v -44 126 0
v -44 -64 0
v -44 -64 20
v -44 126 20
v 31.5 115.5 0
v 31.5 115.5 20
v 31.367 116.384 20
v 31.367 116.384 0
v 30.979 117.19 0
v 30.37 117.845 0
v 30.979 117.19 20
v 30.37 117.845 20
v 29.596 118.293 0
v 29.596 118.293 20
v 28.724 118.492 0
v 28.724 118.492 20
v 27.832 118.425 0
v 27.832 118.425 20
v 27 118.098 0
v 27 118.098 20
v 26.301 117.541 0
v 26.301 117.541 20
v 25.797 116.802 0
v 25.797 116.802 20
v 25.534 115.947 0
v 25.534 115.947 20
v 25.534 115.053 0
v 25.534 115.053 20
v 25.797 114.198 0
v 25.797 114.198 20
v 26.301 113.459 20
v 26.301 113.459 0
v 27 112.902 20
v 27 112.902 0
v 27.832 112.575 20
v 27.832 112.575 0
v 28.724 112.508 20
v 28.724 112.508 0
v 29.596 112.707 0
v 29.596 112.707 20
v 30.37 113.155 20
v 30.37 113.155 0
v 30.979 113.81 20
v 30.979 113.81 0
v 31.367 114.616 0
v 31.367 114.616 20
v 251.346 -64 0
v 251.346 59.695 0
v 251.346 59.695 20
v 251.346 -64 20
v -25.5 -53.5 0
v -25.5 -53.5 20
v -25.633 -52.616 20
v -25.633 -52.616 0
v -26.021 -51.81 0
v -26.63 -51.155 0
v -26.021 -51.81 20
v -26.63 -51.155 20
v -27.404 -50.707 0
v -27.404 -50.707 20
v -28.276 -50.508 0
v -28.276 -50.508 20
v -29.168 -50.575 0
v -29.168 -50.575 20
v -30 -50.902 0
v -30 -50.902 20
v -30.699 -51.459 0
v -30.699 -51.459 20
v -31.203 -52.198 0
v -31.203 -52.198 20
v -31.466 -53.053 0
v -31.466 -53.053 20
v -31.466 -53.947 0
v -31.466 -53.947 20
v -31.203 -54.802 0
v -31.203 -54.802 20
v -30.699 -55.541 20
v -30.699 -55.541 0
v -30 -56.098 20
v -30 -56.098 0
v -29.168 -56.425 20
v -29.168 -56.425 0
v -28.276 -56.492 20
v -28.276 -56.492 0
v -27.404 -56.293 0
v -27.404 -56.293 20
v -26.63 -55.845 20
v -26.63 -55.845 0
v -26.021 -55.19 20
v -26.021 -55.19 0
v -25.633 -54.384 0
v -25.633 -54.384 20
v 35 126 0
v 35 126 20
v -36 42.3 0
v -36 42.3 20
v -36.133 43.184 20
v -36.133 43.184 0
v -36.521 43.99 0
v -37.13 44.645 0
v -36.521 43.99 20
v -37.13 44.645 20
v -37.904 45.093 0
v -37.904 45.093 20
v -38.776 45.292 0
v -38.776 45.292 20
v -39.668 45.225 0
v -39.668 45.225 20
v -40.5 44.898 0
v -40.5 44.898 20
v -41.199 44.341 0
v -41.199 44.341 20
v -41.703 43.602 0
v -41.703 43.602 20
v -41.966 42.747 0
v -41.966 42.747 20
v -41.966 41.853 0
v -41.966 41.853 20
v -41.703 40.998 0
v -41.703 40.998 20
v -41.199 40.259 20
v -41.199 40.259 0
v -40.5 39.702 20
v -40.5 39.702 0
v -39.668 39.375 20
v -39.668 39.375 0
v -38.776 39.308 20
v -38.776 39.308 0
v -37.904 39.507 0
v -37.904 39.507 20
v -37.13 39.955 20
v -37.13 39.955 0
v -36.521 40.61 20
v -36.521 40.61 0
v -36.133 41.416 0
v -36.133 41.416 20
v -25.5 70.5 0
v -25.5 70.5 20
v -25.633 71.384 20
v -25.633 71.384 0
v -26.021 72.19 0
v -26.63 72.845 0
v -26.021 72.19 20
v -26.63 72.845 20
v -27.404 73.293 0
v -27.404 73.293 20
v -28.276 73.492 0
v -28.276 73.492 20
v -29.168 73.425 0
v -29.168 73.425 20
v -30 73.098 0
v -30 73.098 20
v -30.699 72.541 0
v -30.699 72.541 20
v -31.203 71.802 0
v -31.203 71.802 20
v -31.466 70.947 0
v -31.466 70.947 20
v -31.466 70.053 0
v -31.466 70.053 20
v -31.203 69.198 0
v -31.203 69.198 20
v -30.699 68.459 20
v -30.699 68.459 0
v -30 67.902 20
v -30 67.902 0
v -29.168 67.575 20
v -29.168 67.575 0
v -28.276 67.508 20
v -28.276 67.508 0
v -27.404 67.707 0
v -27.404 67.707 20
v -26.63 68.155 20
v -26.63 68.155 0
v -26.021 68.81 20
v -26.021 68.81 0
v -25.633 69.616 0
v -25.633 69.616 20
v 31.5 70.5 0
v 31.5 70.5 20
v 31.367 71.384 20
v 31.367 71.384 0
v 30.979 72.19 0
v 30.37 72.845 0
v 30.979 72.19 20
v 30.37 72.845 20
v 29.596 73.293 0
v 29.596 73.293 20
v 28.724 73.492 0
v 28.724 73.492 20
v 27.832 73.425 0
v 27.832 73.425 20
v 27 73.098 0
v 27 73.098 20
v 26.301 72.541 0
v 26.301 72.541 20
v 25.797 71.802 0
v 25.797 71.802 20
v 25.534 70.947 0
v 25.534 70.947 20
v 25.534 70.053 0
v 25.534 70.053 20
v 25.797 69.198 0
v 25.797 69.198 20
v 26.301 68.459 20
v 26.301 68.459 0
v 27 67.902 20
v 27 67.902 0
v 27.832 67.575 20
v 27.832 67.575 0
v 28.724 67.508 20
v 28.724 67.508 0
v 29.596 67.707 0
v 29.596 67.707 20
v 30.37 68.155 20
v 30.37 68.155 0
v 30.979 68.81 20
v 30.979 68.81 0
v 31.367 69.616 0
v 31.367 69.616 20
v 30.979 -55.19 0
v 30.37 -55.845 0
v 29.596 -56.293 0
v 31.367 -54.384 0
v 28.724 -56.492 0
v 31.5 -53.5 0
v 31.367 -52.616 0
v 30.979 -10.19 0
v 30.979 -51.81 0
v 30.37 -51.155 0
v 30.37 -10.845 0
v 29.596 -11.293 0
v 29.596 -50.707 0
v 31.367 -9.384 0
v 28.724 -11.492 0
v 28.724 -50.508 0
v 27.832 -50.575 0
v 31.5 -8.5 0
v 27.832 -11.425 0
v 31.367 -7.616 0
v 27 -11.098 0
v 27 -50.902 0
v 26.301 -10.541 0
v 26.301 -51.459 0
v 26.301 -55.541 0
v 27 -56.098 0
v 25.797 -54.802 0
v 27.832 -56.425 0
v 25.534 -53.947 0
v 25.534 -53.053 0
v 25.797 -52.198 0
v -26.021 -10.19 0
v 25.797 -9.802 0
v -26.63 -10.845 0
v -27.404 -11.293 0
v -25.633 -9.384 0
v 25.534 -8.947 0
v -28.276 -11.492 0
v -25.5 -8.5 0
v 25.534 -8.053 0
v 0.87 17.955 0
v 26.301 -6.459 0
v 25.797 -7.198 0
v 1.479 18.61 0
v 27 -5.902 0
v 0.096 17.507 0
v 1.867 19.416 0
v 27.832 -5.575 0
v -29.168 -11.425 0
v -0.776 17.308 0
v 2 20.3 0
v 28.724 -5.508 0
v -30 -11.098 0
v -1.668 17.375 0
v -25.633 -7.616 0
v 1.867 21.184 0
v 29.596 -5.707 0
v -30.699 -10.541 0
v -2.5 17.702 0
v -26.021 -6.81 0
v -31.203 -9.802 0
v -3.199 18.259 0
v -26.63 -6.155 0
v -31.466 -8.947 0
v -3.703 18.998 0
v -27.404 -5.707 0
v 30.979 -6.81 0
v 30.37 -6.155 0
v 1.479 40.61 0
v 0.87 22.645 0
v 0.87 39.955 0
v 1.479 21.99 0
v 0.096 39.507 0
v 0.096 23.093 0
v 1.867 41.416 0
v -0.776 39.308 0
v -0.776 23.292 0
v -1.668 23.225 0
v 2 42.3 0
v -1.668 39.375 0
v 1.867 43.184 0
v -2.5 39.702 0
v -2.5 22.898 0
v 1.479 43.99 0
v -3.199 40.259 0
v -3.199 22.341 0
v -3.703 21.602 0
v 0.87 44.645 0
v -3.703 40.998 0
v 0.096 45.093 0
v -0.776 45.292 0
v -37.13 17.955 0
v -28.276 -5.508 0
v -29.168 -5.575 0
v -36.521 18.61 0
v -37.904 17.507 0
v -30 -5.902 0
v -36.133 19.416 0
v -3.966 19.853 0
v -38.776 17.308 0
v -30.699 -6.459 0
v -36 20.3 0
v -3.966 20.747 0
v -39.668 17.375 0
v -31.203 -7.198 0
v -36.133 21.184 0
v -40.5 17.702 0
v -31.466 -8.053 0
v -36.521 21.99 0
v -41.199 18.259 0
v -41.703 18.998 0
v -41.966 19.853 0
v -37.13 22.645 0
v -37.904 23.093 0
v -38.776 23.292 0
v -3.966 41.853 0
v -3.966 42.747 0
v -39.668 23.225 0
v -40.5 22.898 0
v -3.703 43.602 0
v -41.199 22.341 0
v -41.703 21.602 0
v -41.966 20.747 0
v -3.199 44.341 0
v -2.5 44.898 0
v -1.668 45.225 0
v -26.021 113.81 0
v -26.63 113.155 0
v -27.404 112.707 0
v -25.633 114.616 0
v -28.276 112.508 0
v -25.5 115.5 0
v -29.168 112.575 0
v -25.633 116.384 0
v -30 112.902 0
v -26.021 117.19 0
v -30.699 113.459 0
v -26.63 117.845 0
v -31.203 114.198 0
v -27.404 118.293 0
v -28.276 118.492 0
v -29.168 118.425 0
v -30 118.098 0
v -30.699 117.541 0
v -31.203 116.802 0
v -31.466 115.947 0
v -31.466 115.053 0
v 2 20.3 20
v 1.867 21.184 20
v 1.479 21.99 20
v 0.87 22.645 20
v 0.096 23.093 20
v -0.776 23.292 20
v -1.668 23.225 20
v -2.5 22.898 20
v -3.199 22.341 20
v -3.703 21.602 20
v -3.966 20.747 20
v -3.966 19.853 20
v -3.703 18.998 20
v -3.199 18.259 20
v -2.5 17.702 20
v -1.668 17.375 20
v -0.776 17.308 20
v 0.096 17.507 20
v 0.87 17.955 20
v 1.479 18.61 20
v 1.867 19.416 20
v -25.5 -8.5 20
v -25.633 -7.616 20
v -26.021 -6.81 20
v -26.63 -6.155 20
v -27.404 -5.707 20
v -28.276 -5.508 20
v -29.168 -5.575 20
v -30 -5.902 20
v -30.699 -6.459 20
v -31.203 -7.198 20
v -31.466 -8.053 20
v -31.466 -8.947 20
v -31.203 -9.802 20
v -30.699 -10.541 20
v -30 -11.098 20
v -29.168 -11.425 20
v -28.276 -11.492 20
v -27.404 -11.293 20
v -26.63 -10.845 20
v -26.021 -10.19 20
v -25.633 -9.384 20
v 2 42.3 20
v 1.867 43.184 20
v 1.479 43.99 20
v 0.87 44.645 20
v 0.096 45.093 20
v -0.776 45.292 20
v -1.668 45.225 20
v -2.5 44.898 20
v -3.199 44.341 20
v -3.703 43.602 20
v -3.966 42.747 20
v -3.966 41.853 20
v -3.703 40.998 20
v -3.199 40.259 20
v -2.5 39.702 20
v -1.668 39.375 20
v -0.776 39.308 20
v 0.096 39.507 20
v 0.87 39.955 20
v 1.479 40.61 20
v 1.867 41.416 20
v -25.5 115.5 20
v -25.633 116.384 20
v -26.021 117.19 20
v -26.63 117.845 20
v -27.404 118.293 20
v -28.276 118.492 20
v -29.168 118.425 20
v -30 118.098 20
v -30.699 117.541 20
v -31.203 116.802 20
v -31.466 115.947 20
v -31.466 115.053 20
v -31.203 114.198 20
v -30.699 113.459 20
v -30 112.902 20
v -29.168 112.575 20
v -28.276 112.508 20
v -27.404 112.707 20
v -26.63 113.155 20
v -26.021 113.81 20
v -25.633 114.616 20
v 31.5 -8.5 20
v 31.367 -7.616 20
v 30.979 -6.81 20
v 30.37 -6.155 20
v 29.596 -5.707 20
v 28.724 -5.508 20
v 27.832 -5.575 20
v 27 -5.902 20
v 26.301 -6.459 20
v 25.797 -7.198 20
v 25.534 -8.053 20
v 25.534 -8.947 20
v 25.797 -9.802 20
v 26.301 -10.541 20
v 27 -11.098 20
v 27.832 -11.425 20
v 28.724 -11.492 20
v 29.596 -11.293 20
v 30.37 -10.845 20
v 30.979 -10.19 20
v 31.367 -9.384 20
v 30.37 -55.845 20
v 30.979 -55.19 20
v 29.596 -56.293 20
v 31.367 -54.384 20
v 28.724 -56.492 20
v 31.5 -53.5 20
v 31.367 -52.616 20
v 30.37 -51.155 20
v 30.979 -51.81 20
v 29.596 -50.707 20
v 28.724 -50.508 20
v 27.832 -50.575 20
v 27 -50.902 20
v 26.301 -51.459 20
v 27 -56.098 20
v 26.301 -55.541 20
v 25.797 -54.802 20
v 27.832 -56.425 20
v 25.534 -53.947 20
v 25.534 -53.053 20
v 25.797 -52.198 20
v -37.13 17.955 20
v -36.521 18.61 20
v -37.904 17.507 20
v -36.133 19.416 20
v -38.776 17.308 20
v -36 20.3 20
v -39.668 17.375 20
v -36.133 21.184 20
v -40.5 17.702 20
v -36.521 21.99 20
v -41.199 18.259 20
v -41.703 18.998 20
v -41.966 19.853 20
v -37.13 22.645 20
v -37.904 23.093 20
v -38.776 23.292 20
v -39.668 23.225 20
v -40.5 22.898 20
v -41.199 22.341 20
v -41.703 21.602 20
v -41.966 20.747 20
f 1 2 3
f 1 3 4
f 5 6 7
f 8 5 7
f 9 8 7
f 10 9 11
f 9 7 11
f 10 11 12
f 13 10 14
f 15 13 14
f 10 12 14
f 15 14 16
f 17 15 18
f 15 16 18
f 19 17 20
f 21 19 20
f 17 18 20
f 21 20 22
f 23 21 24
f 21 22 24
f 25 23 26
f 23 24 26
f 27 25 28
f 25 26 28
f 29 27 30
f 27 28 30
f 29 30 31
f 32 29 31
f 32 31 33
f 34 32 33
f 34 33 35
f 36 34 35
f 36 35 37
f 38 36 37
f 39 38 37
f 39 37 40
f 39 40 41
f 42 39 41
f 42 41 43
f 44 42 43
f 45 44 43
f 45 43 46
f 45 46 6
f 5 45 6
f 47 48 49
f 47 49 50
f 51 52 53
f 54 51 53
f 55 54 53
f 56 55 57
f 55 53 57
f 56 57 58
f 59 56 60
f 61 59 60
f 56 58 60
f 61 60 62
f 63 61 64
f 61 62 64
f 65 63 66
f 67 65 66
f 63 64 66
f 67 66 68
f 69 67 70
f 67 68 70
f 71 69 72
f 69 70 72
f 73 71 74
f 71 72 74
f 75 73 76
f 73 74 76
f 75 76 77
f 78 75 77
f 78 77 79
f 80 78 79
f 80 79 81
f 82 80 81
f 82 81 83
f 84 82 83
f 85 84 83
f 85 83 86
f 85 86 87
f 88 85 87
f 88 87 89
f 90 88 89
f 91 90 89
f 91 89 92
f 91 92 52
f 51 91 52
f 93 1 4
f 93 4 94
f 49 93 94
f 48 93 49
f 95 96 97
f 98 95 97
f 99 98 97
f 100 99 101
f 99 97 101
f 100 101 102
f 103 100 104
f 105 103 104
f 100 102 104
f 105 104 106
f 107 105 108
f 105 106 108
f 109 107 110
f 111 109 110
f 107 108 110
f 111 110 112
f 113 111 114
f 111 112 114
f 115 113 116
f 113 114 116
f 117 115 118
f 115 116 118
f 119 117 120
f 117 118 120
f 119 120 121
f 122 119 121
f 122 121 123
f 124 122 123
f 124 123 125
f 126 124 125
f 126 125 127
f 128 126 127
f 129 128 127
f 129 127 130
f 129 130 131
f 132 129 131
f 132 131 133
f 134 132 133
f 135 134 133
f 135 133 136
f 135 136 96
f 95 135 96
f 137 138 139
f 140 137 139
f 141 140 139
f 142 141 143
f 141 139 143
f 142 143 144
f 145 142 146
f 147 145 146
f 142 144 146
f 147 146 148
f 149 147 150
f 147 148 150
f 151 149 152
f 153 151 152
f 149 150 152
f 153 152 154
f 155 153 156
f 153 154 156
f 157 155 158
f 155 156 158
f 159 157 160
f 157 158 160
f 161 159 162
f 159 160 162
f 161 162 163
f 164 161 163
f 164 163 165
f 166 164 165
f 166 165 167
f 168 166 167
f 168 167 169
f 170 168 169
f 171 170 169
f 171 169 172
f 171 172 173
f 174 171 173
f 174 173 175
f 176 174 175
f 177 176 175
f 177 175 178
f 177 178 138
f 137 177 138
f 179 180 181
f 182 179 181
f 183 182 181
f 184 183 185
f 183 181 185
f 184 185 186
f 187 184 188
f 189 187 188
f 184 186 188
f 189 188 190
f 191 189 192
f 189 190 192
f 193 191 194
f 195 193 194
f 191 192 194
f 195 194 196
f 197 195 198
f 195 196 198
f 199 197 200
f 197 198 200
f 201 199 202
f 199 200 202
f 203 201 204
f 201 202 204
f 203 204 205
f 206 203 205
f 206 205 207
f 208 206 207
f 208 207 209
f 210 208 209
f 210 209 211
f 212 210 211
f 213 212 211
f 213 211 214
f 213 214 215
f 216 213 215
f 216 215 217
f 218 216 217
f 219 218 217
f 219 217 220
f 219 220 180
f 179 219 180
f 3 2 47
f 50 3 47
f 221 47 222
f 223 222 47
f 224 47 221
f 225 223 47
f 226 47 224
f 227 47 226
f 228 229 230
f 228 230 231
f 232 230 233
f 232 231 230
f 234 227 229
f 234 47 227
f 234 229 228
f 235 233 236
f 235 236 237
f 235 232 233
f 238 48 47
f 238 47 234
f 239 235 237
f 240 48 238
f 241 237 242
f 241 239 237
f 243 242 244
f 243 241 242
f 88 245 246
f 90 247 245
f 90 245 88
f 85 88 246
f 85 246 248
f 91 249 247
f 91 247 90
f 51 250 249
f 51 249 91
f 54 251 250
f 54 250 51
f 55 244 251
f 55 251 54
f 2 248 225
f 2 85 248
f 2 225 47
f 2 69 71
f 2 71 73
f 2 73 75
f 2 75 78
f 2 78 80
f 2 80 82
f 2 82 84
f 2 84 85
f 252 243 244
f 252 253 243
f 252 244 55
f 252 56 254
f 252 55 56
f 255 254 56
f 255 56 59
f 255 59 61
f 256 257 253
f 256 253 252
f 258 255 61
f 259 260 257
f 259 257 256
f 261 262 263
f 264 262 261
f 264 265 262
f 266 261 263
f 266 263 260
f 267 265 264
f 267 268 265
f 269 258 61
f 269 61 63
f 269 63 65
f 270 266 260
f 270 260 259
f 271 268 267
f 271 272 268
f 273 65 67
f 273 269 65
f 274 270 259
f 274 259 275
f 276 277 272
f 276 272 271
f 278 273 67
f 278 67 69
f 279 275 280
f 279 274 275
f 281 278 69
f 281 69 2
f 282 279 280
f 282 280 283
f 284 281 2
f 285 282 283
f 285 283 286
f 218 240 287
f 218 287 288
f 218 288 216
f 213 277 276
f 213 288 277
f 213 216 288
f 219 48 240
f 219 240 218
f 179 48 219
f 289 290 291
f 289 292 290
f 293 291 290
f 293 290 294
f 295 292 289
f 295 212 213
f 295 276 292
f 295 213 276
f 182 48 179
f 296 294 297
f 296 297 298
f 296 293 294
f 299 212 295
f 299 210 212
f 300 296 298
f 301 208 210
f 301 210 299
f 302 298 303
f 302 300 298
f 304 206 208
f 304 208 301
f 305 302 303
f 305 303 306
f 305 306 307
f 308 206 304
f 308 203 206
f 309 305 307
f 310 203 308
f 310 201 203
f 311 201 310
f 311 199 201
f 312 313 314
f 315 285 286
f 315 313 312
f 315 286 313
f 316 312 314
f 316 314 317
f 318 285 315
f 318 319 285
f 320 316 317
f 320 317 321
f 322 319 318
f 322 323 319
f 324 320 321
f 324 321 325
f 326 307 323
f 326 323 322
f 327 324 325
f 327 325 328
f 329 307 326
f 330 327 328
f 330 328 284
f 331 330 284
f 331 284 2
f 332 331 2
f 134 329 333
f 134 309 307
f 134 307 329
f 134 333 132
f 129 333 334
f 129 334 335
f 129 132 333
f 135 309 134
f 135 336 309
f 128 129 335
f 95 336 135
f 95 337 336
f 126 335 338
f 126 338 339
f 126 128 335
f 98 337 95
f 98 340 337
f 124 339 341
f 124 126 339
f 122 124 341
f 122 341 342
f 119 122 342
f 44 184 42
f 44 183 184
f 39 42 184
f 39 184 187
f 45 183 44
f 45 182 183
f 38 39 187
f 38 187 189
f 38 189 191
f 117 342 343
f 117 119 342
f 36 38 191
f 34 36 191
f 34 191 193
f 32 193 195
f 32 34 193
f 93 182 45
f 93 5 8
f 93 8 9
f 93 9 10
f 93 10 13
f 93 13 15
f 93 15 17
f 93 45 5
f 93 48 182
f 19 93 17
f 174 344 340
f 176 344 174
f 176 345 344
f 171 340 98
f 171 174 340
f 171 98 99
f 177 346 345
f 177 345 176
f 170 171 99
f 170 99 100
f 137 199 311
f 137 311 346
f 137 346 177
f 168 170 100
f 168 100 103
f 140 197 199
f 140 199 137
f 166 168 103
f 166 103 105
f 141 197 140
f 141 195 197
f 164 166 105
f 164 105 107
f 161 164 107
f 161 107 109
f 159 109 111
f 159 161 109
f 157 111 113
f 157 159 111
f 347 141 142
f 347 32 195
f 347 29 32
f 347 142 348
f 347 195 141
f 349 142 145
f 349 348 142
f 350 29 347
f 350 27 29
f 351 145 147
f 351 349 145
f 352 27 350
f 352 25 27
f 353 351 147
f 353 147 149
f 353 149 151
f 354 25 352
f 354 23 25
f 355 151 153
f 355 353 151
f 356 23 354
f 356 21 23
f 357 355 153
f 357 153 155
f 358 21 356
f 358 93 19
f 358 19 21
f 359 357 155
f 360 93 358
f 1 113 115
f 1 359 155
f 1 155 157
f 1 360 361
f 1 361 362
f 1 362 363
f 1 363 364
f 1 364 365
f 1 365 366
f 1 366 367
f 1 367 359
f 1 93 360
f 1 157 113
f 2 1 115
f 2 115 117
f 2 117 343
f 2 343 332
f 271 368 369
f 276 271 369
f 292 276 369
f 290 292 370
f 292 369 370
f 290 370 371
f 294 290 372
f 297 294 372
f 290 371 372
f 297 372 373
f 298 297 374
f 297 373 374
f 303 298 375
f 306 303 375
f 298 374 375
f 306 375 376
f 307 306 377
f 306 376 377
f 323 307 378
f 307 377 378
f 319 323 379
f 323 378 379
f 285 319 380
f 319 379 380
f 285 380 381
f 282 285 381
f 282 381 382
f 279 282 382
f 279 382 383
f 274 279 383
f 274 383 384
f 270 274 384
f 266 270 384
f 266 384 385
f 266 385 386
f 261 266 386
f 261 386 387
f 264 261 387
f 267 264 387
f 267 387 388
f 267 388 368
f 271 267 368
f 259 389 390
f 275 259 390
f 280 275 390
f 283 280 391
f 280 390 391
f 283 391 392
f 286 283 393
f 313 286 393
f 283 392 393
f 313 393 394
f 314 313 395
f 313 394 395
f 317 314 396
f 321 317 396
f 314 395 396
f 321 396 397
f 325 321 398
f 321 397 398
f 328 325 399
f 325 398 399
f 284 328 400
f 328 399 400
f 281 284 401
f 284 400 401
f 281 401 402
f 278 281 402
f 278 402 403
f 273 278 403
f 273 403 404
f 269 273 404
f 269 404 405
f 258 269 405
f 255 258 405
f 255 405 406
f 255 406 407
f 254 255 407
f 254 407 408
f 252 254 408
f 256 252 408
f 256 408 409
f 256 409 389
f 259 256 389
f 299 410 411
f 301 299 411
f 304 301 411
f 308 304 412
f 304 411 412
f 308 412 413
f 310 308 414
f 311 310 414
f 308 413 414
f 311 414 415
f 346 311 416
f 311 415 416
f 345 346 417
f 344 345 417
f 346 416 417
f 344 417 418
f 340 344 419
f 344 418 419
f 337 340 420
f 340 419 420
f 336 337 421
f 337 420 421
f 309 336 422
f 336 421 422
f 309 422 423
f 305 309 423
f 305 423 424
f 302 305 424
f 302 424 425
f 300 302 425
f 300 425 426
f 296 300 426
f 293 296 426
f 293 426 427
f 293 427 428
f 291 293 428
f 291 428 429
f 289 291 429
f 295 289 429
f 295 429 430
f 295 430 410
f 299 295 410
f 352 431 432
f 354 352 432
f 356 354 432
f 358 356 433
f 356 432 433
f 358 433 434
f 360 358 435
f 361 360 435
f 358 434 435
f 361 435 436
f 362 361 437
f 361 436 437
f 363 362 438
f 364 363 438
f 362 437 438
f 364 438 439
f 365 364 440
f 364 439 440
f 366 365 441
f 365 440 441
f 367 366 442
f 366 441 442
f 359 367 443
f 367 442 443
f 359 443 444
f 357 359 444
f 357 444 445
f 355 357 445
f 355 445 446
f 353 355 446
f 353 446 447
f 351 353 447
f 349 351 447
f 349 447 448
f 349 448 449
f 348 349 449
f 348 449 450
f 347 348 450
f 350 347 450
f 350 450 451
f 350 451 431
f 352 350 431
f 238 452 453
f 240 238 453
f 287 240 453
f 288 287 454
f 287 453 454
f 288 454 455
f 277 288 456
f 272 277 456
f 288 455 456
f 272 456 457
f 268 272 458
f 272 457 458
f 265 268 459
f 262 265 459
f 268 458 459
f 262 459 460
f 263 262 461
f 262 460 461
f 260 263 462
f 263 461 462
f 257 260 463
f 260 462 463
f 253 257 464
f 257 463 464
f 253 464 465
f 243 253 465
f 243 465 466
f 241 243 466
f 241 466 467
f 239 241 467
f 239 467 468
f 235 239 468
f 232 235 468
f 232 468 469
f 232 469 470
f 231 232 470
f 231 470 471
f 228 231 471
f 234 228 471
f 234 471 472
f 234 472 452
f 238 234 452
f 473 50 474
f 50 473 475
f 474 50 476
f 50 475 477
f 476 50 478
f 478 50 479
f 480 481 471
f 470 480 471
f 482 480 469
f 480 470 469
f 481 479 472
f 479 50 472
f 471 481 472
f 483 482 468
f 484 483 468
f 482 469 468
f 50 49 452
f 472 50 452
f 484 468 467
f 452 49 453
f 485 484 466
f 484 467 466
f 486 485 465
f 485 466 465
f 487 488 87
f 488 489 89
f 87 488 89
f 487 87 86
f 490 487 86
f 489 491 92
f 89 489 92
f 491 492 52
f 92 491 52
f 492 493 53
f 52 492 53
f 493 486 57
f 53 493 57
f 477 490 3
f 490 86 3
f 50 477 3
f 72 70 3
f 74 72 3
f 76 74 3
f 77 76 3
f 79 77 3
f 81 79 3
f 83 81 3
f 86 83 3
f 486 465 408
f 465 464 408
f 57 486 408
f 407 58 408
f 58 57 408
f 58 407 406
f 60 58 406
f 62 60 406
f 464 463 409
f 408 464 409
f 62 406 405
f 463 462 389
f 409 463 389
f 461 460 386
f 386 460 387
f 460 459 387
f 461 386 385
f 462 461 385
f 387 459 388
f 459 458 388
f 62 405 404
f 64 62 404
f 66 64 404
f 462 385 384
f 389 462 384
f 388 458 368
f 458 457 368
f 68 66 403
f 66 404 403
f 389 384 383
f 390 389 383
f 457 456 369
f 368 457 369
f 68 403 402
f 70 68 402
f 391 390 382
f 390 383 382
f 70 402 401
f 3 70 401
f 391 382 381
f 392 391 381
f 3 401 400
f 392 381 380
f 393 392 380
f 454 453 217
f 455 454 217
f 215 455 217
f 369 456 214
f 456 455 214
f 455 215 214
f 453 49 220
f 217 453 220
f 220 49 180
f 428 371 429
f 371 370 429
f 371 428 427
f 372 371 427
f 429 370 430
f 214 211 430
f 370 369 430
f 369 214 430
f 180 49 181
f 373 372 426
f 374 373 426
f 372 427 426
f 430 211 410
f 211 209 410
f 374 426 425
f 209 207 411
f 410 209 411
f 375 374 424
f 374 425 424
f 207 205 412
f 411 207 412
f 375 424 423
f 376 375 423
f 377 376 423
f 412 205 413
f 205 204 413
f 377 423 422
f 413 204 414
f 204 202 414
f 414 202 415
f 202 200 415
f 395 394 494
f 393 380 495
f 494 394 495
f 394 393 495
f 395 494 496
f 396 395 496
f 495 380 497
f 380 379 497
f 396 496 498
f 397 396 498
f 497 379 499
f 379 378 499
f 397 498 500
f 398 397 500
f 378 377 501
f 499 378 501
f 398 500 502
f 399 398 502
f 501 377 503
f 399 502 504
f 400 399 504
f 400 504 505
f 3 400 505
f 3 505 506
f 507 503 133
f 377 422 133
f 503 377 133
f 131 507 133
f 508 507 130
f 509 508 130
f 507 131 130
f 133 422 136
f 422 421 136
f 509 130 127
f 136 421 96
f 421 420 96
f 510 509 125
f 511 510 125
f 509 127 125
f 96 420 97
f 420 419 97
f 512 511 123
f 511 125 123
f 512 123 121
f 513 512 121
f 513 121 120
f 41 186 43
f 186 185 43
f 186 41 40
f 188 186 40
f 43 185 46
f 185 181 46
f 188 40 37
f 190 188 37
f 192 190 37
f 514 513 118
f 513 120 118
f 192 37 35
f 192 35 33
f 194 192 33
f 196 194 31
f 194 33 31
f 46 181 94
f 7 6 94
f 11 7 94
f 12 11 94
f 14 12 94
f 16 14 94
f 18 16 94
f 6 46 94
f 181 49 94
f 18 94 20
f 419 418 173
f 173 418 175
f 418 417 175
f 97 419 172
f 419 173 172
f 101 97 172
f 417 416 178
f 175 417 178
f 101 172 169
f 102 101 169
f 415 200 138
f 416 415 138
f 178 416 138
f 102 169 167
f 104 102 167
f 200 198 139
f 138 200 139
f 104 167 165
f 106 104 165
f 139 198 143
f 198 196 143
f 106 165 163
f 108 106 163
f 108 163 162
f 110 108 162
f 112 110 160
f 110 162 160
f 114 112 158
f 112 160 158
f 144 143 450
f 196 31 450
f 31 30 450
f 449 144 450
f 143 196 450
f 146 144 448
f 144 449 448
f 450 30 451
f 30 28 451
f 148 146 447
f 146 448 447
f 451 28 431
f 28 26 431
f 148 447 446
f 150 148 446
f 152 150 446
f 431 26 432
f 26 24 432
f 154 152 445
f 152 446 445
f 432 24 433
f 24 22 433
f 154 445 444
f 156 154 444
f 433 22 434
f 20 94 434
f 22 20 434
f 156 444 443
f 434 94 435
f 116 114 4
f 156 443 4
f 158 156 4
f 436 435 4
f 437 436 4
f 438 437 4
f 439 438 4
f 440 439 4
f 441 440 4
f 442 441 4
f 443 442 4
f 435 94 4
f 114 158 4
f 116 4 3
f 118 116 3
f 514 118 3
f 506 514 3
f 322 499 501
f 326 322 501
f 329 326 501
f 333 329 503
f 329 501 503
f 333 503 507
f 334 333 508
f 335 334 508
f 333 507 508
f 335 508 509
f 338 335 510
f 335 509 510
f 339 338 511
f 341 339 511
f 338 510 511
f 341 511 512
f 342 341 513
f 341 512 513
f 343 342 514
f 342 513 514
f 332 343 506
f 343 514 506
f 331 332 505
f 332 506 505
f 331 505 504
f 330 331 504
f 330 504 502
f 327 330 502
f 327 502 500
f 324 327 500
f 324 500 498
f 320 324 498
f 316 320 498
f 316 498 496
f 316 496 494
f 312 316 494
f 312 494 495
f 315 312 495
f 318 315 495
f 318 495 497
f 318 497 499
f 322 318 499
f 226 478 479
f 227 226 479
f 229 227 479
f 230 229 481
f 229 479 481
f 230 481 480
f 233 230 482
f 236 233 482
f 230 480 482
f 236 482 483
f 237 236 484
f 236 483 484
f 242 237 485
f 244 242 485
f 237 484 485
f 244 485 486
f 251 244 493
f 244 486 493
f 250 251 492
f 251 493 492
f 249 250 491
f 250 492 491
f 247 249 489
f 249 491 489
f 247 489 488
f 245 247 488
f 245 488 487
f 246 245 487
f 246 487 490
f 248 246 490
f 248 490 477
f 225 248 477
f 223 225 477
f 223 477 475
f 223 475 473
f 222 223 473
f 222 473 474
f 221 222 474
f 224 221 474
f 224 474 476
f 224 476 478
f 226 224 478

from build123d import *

# Parameters (mm, degrees)
BOSS_EXTRUDE1_DEPTH      = 20
SCHIZZO6_R               = 3
TAGLIO_ESTRUSIONE1_DEPTH = 282.870567709


with BuildPart() as part:
    # Sketch1 → Boss-Extrude1 (new body)
    with BuildSketch(Plane.XY):
        Polygon((35, -64), (-43.999999997, -64), (-43.999999997, 126), (35, 126), (251.346408251, 59.694869443), (251.346408251, -64), align=None)
    extrude(amount=BOSS_EXTRUDE1_DEPTH)

    # Schizzo6 → Taglio-Estrusione1 (cut, through all)
    with BuildSketch(Plane.XY.offset(20)):
        with Locations((28.5, -53.5)):
            Circle(SCHIZZO6_R)
        with Locations((-28.5, -53.5)):
            Circle(SCHIZZO6_R)
        with Locations((-28.5, -8.5)):
            Circle(SCHIZZO6_R)
        with Locations((28.5, -8.5)):
            Circle(SCHIZZO6_R)
        with Locations((28.5, 115.5)):
            Circle(SCHIZZO6_R)
        with Locations((28.5, 70.5)):
            Circle(SCHIZZO6_R)
        with Locations((-28.5, 115.5)):
            Circle(SCHIZZO6_R)
        with Locations((-28.5, 70.5)):
            Circle(SCHIZZO6_R)
        with Locations((-38.999999997, 20.3)):
            Circle(SCHIZZO6_R)
        with Locations((-38.999999997, 42.3)):
            Circle(SCHIZZO6_R)
        with Locations((-0.999999997, 20.3)):
            Circle(SCHIZZO6_R)
        with Locations((-0.999999997, 42.3)):
            Circle(SCHIZZO6_R)
    extrude(amount=-TAGLIO_ESTRUSIONE1_DEPTH, mode=Mode.SUBTRACT)


solid = part.part
